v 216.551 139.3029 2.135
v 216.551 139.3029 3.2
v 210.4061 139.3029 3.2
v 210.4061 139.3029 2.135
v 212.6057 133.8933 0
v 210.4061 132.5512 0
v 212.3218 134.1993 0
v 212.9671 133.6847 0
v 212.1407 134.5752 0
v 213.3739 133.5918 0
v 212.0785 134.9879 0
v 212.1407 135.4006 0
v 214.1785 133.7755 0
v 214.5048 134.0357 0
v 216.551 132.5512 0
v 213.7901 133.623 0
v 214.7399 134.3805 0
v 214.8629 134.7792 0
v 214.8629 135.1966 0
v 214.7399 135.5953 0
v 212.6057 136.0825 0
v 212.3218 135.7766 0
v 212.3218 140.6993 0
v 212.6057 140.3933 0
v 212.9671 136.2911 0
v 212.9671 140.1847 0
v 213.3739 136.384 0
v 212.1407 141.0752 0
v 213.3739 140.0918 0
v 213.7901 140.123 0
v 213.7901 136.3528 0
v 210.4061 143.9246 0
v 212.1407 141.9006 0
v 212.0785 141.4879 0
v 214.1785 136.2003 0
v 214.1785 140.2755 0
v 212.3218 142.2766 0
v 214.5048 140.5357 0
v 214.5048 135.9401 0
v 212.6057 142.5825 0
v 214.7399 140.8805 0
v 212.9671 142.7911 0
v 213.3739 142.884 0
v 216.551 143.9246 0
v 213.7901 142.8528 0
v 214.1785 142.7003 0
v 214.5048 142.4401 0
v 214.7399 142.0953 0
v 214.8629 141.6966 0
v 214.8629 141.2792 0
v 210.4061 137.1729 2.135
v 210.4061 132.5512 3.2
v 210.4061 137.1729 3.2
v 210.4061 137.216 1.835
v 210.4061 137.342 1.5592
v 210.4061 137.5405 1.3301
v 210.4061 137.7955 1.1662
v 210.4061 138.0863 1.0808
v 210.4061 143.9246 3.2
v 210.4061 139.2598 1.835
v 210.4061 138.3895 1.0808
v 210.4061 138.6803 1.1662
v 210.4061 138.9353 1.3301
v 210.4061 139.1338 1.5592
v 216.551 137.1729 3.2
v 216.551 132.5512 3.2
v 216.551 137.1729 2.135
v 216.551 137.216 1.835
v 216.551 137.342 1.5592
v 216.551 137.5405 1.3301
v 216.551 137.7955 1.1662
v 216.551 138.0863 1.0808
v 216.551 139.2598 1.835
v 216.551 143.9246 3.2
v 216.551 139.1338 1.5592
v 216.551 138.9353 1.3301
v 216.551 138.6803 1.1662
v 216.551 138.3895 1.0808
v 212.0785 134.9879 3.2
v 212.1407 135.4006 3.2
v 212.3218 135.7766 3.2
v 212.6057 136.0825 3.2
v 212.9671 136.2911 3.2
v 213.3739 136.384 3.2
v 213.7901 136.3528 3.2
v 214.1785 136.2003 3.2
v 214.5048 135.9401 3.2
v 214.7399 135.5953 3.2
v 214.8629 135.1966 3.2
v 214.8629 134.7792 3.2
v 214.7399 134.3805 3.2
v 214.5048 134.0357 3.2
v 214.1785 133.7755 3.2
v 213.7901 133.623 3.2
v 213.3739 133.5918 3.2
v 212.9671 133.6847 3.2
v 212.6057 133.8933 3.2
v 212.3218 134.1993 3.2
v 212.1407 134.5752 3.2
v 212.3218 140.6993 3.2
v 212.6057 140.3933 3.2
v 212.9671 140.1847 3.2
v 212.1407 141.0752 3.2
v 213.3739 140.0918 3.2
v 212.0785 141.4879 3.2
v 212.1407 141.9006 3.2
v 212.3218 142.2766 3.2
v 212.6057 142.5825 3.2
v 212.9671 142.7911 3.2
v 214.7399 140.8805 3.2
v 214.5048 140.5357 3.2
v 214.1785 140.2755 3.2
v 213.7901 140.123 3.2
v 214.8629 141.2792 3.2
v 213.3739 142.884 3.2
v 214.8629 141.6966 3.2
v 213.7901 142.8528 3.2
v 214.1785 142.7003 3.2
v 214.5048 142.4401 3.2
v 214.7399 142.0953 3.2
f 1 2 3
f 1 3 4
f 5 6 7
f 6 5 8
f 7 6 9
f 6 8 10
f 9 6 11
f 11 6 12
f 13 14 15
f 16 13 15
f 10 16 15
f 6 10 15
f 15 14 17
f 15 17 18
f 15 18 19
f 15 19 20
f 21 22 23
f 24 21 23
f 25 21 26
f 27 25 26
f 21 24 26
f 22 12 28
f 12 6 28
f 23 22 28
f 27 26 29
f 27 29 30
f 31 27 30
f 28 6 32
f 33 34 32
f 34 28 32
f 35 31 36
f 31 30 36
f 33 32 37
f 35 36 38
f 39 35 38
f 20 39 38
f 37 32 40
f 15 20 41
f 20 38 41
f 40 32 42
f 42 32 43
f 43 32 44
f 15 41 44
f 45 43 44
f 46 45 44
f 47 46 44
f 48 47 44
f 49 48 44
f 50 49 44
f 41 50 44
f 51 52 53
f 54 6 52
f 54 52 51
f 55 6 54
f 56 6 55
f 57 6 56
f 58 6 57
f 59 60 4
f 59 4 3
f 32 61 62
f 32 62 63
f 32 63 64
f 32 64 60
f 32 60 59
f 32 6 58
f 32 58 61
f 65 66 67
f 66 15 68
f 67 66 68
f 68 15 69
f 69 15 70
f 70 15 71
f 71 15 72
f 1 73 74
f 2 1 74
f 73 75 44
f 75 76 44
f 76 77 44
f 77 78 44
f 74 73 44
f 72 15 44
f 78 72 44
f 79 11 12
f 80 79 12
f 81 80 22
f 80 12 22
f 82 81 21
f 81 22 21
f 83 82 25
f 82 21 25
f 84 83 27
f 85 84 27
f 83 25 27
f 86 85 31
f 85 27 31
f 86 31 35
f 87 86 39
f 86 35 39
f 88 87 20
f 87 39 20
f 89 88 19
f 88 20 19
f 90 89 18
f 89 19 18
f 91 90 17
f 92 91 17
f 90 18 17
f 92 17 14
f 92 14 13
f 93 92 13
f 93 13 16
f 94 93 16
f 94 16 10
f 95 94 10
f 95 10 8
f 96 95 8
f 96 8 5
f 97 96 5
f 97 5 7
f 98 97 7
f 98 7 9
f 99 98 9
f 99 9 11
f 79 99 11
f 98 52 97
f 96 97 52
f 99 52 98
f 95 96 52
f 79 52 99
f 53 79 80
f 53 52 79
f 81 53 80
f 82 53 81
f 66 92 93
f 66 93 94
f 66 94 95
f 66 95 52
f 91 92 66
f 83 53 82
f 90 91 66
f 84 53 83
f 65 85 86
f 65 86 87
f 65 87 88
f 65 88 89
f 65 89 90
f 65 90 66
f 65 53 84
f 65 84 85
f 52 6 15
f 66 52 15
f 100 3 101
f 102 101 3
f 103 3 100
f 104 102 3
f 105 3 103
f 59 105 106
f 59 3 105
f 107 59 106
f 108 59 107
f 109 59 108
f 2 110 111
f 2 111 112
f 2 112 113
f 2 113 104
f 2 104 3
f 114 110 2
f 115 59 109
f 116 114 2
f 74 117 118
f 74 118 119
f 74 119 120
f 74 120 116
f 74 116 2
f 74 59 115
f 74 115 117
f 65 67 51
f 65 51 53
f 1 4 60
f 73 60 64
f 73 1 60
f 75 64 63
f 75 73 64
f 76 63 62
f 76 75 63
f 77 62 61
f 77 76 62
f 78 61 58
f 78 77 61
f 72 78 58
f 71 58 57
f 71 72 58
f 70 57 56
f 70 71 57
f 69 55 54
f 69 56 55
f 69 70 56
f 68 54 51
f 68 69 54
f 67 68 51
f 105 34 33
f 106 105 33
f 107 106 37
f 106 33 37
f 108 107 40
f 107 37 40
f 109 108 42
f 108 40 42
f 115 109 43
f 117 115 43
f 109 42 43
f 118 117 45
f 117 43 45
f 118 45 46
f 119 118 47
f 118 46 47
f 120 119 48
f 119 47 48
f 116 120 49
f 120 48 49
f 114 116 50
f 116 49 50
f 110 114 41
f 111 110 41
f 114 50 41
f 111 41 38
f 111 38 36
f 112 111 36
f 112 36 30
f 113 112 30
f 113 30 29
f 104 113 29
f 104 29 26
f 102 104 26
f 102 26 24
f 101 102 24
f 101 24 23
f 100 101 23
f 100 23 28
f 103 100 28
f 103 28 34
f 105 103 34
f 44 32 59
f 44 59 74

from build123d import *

# Parameters (mm, degrees)
SKETCH1_W           = 6.14482622
SKETCH1_H           = 11.373318705
BOSS_EXTRUDE1_DEPTH = 3.2
SKETCH2_R           = 1.4
CUT_EXTRUDE1_DEPTH  = 261.036225732
CUT_EXTRUDE2_DEPTH  = 145.0912201


with BuildPart() as part:
    # Sketch1 → Boss-Extrude1 (new body)
    with BuildSketch(Plane.XY):
        with Locations((213.478545955, 138.237907074)):
            Rectangle(SKETCH1_W, SKETCH1_H)
    extrude(amount=BOSS_EXTRUDE1_DEPTH)

    # Sketch2 → Cut-Extrude1 (cut, through all)
    with BuildSketch(Plane(origin=(0, 0, 0), x_dir=(-1, 0, 0), z_dir=(0, 0, -1))):
        with Locations((-213.478545955, 141.487907073)):
            Circle(SKETCH2_R)
        with Locations((-213.478545955, 134.987907073)):
            Circle(SKETCH2_R)
    extrude(amount=-CUT_EXTRUDE1_DEPTH, mode=Mode.SUBTRACT)

    # Sketch3 → Cut-Extrude2 (cut, through all)
    with BuildSketch(Plane(origin=(216.550959065, 0, 0), x_dir=(0, 0, -1), z_dir=(1, 0, 0))):
        with BuildLine():
            Line((-2.135, 137.172907073), (-3.2, 137.172907073))
            Line((-3.2, 137.172907073), (-3.2, 139.302907073))
            Line((-3.2, 139.302907073), (-2.135, 139.302907073))
            ThreePointArc((-2.135, 139.302907073), (-1.07, 138.237907073), (-2.135, 137.172907073))
        make_face()
    extrude(amount=-CUT_EXTRUDE2_DEPTH, mode=Mode.SUBTRACT)


solid = part.part
